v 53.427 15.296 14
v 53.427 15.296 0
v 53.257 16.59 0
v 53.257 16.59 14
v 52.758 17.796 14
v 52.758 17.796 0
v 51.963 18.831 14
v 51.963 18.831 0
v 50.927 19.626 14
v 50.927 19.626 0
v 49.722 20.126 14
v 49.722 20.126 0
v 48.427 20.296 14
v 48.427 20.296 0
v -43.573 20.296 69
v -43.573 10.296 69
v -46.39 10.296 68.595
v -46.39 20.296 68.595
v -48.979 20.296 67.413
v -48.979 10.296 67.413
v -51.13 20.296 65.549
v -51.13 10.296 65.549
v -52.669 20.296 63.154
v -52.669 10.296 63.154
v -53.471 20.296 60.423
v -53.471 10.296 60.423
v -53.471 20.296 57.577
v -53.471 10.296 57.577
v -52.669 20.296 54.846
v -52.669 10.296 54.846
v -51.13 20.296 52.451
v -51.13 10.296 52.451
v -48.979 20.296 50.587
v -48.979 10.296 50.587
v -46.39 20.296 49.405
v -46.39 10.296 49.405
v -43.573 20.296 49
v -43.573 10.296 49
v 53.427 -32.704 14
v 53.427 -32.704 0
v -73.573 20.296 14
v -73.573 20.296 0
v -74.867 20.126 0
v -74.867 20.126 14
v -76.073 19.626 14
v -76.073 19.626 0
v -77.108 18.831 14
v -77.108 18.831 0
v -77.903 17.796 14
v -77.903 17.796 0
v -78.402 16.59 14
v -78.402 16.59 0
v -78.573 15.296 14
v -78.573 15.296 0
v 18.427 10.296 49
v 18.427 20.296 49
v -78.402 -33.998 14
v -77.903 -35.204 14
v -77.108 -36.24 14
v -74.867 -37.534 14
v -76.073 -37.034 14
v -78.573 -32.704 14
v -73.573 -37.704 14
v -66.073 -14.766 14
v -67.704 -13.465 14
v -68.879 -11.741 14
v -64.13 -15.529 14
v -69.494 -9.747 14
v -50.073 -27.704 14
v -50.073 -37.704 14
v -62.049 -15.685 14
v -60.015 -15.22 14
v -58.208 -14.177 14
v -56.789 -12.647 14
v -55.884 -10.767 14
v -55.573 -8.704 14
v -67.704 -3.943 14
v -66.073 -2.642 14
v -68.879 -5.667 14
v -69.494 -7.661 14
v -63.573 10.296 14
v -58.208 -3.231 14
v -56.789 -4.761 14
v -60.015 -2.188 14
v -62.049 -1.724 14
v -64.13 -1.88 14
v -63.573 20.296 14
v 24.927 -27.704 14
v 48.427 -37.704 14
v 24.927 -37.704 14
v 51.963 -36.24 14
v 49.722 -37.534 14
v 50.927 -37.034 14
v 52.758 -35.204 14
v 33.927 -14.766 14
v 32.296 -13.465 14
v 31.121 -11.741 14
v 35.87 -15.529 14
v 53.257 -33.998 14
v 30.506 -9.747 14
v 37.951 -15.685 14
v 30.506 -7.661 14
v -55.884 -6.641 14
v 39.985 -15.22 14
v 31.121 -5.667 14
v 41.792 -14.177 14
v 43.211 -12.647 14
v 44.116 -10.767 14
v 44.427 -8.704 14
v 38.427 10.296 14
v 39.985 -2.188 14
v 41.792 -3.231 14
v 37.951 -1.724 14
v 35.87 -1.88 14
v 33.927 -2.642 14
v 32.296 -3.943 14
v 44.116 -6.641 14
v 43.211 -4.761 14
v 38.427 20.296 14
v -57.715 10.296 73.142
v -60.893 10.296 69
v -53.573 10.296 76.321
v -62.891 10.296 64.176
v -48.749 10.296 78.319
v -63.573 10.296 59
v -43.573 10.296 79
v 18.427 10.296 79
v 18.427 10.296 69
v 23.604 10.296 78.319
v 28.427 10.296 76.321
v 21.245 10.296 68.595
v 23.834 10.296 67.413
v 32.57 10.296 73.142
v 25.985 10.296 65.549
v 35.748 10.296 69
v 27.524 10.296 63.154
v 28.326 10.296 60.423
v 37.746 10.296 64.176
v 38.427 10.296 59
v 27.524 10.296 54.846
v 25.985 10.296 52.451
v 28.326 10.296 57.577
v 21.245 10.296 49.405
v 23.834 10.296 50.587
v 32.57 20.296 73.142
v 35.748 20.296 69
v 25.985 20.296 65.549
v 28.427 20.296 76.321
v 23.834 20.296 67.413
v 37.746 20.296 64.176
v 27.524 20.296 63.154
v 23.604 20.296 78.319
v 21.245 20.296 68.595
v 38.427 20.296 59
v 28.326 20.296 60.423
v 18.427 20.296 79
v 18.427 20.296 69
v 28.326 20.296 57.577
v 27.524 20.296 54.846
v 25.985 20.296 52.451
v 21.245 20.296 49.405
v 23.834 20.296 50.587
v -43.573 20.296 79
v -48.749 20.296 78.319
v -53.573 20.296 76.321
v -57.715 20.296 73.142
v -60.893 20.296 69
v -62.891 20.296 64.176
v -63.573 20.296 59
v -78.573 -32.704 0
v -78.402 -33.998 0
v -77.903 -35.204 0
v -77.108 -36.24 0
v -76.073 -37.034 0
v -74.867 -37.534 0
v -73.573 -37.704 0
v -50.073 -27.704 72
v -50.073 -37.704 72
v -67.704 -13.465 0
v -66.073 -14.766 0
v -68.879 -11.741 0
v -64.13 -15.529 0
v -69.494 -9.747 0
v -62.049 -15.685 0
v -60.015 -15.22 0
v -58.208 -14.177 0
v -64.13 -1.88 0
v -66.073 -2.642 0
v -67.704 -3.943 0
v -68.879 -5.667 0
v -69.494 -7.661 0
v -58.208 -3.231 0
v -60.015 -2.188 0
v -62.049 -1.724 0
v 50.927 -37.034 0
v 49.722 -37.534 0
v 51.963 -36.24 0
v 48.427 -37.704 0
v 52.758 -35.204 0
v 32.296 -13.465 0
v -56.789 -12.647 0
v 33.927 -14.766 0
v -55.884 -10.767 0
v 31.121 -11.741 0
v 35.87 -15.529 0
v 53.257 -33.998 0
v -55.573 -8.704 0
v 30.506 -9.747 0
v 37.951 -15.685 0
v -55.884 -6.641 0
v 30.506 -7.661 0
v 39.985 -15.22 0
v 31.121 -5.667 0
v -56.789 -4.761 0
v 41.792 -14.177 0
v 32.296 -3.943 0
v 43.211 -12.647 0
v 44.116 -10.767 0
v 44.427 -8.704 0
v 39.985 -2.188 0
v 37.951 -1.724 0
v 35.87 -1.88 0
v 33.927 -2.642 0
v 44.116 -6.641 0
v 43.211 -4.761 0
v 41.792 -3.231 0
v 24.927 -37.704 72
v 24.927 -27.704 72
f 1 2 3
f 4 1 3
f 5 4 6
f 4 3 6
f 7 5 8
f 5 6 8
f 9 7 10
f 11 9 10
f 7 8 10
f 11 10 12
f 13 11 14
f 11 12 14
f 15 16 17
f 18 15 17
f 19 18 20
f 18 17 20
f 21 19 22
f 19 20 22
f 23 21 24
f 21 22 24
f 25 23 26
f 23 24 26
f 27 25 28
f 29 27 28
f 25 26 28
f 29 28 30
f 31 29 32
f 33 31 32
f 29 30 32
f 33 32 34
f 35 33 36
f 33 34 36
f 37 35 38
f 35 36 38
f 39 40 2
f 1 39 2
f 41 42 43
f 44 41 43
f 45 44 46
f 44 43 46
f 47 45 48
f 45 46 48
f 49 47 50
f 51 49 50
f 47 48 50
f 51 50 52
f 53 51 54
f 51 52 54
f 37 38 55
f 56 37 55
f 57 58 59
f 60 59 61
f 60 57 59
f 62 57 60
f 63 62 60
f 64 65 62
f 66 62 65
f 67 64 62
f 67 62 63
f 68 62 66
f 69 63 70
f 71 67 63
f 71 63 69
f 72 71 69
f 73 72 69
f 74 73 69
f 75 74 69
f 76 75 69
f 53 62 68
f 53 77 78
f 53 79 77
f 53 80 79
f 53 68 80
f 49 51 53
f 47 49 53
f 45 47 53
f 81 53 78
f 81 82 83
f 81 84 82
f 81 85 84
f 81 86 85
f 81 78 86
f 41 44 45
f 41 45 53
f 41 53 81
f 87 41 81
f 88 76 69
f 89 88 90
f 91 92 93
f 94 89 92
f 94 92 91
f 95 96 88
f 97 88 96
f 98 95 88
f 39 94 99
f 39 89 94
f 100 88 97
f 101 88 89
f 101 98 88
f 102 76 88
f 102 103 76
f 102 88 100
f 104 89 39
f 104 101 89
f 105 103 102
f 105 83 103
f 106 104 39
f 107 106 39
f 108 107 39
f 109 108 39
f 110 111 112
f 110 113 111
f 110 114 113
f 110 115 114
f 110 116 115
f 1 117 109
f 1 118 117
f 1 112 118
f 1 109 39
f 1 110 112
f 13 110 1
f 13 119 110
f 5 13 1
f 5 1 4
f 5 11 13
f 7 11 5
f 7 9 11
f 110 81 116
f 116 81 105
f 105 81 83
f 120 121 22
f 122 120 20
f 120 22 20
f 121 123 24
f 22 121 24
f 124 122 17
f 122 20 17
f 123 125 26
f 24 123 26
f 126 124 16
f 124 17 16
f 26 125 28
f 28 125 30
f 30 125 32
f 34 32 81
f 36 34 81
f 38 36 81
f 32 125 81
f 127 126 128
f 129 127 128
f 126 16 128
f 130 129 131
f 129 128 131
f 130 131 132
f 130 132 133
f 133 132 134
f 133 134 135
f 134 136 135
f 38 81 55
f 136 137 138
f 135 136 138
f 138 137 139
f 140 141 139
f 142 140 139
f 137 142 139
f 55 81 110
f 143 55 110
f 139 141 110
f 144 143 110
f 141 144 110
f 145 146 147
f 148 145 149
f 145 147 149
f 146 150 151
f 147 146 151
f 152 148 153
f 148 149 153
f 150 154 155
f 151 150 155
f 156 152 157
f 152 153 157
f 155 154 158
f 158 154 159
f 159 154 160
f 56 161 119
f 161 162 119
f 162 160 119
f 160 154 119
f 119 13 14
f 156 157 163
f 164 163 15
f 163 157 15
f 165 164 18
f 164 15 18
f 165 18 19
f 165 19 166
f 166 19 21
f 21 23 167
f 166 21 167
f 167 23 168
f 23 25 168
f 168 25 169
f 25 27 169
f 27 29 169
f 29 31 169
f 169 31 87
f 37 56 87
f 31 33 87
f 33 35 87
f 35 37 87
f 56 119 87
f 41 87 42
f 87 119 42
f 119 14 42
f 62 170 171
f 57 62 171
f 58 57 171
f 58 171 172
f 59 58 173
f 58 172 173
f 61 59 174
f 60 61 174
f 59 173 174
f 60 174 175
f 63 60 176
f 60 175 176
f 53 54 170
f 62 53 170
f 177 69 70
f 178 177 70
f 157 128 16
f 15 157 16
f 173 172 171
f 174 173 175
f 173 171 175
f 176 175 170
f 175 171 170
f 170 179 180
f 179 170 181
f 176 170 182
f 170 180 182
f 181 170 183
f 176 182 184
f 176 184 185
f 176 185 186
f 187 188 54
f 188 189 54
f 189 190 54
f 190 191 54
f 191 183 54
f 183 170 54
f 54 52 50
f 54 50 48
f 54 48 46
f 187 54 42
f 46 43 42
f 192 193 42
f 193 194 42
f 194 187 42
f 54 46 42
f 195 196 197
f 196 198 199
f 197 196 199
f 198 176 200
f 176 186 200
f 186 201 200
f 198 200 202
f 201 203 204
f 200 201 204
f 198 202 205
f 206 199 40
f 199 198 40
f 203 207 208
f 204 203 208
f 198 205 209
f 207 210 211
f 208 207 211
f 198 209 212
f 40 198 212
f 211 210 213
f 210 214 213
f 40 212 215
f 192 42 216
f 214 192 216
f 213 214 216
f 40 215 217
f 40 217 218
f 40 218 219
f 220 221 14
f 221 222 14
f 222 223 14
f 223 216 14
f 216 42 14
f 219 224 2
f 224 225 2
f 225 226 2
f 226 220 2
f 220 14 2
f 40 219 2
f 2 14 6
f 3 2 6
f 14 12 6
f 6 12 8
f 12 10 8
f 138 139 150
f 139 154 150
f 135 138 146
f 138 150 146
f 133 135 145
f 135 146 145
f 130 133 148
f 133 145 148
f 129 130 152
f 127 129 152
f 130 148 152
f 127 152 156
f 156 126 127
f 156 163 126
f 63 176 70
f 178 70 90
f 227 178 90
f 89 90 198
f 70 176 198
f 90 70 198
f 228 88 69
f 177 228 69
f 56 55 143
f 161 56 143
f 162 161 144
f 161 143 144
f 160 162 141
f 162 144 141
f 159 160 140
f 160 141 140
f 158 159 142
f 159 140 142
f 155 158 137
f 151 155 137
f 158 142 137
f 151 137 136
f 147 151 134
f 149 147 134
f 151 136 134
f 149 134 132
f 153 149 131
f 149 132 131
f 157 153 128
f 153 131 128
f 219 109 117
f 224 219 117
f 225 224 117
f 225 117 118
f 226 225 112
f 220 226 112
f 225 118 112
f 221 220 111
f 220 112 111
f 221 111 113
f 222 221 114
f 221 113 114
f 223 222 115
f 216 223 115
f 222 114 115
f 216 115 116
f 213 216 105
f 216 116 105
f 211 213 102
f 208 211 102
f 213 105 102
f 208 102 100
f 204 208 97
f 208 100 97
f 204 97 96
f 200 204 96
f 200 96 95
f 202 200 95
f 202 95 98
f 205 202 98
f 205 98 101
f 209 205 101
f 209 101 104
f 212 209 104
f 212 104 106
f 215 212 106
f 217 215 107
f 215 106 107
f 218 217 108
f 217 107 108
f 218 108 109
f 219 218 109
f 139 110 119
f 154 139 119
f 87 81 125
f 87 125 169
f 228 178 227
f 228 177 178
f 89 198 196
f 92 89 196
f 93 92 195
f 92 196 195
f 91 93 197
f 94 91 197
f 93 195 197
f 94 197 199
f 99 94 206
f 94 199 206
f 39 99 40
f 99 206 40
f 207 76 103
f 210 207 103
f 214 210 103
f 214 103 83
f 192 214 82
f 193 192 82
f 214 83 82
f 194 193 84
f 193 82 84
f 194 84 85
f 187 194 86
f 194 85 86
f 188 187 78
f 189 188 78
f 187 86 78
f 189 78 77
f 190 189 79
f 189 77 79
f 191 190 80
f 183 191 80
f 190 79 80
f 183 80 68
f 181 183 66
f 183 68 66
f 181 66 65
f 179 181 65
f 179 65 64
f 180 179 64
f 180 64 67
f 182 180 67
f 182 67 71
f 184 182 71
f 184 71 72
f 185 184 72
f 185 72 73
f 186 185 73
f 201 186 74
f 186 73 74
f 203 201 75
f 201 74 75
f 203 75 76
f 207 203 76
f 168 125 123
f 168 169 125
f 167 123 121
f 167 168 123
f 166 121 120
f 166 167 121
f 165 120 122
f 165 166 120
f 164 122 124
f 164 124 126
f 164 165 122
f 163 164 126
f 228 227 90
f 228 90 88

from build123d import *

# Parameters (mm, degrees)
F1_DEPTH  = 14
F2_W      = 102
F2_H      = 10
F3_DEPTH  = 65
F4_R      = 20
F6_DEPTH  = 10
F7_R      = 7
F8_DEPTH  = 14
F9_R      = 7
F10_DEPTH = 14
F12_DEPTH = 58


with BuildPart() as f1:
    # F0 (on Top) → F1 (new body)
    with BuildSketch(Plane.XY):
        with BuildLine():
            ThreePointArc((-78.572579, -32.704081), (-77.108113, -36.239615), (-73.572579, -37.704081))
            Line((-73.572579, -37.704081), (48.427421, -37.704081))
            ThreePointArc((48.427421, -37.704081), (51.962955, -36.239615), (53.427421, -32.704081))
            Line((53.427421, -32.704081), (53.427421, 15.295919))
            ThreePointArc((53.427421, 15.295919), (51.962955, 18.831453), (48.427421, 20.295919))
            Line((48.427421, 20.295919), (-73.572579, 20.295919))
            ThreePointArc((-73.572579, 20.295919), (-77.108113, 18.831453), (-78.572579, 15.295919))
            Line((-78.572579, 15.295919), (-78.572579, -32.704081))
        make_face()
    extrude(amount=F1_DEPTH)

    # F2 (on face) → F3 (join)
    with BuildSketch(Plane.XY.offset(14)):
        with Locations((-12.572579, 15.295919)):
            Rectangle(F2_W, F2_H)
    extrude(amount=F3_DEPTH)

    # F4
    f4_edges = [f1.edges().sort_by_distance(p)[0] for p in [
        (-63.572579, 15.295919, 79),
        (38.427421, 15.295919, 79),
    ]]
    fillet(f4_edges, radius=F4_R)

    # F5 (on face) → F6 (cut)
    with BuildSketch(Plane.XZ.offset(-10.295919)):
        with BuildLine():
            Line((18.427421, 69), (-43.572579, 69))
            ThreePointArc((-43.572579, 69), (-53.572579, 59), (-43.572579, 49))
            Line((-43.572579, 49), (18.427421, 49))
            ThreePointArc((18.427421, 49), (28.427421, 59), (18.427421, 69))
        make_face()
    extrude(amount=-F6_DEPTH, mode=Mode.SUBTRACT)

    # F7 (on face) → F8 (cut)
    with BuildSketch(Plane.XY.offset(14)):
        with Locations((-62.572579, -8.704081)):
            Circle(F7_R)
    extrude(amount=-F8_DEPTH, mode=Mode.SUBTRACT)

    # F9 (on face) → F10 (cut)
    with BuildSketch(Plane.XY.offset(14)):
        with Locations((37.427421, -8.704081)):
            Circle(F9_R)
    extrude(amount=-F10_DEPTH, mode=Mode.SUBTRACT)

    # F11 (on face) → F12 (join)
    with BuildSketch(Plane.XY.offset(14)):
        Polygon((-50.072579, -37.704081), (-12.572579, -37.704081), (24.927421, -37.704081), (24.927421, -27.704081), (-50.072579, -27.704081), align=None)
    extrude(amount=F12_DEPTH)


solid = f1.part
